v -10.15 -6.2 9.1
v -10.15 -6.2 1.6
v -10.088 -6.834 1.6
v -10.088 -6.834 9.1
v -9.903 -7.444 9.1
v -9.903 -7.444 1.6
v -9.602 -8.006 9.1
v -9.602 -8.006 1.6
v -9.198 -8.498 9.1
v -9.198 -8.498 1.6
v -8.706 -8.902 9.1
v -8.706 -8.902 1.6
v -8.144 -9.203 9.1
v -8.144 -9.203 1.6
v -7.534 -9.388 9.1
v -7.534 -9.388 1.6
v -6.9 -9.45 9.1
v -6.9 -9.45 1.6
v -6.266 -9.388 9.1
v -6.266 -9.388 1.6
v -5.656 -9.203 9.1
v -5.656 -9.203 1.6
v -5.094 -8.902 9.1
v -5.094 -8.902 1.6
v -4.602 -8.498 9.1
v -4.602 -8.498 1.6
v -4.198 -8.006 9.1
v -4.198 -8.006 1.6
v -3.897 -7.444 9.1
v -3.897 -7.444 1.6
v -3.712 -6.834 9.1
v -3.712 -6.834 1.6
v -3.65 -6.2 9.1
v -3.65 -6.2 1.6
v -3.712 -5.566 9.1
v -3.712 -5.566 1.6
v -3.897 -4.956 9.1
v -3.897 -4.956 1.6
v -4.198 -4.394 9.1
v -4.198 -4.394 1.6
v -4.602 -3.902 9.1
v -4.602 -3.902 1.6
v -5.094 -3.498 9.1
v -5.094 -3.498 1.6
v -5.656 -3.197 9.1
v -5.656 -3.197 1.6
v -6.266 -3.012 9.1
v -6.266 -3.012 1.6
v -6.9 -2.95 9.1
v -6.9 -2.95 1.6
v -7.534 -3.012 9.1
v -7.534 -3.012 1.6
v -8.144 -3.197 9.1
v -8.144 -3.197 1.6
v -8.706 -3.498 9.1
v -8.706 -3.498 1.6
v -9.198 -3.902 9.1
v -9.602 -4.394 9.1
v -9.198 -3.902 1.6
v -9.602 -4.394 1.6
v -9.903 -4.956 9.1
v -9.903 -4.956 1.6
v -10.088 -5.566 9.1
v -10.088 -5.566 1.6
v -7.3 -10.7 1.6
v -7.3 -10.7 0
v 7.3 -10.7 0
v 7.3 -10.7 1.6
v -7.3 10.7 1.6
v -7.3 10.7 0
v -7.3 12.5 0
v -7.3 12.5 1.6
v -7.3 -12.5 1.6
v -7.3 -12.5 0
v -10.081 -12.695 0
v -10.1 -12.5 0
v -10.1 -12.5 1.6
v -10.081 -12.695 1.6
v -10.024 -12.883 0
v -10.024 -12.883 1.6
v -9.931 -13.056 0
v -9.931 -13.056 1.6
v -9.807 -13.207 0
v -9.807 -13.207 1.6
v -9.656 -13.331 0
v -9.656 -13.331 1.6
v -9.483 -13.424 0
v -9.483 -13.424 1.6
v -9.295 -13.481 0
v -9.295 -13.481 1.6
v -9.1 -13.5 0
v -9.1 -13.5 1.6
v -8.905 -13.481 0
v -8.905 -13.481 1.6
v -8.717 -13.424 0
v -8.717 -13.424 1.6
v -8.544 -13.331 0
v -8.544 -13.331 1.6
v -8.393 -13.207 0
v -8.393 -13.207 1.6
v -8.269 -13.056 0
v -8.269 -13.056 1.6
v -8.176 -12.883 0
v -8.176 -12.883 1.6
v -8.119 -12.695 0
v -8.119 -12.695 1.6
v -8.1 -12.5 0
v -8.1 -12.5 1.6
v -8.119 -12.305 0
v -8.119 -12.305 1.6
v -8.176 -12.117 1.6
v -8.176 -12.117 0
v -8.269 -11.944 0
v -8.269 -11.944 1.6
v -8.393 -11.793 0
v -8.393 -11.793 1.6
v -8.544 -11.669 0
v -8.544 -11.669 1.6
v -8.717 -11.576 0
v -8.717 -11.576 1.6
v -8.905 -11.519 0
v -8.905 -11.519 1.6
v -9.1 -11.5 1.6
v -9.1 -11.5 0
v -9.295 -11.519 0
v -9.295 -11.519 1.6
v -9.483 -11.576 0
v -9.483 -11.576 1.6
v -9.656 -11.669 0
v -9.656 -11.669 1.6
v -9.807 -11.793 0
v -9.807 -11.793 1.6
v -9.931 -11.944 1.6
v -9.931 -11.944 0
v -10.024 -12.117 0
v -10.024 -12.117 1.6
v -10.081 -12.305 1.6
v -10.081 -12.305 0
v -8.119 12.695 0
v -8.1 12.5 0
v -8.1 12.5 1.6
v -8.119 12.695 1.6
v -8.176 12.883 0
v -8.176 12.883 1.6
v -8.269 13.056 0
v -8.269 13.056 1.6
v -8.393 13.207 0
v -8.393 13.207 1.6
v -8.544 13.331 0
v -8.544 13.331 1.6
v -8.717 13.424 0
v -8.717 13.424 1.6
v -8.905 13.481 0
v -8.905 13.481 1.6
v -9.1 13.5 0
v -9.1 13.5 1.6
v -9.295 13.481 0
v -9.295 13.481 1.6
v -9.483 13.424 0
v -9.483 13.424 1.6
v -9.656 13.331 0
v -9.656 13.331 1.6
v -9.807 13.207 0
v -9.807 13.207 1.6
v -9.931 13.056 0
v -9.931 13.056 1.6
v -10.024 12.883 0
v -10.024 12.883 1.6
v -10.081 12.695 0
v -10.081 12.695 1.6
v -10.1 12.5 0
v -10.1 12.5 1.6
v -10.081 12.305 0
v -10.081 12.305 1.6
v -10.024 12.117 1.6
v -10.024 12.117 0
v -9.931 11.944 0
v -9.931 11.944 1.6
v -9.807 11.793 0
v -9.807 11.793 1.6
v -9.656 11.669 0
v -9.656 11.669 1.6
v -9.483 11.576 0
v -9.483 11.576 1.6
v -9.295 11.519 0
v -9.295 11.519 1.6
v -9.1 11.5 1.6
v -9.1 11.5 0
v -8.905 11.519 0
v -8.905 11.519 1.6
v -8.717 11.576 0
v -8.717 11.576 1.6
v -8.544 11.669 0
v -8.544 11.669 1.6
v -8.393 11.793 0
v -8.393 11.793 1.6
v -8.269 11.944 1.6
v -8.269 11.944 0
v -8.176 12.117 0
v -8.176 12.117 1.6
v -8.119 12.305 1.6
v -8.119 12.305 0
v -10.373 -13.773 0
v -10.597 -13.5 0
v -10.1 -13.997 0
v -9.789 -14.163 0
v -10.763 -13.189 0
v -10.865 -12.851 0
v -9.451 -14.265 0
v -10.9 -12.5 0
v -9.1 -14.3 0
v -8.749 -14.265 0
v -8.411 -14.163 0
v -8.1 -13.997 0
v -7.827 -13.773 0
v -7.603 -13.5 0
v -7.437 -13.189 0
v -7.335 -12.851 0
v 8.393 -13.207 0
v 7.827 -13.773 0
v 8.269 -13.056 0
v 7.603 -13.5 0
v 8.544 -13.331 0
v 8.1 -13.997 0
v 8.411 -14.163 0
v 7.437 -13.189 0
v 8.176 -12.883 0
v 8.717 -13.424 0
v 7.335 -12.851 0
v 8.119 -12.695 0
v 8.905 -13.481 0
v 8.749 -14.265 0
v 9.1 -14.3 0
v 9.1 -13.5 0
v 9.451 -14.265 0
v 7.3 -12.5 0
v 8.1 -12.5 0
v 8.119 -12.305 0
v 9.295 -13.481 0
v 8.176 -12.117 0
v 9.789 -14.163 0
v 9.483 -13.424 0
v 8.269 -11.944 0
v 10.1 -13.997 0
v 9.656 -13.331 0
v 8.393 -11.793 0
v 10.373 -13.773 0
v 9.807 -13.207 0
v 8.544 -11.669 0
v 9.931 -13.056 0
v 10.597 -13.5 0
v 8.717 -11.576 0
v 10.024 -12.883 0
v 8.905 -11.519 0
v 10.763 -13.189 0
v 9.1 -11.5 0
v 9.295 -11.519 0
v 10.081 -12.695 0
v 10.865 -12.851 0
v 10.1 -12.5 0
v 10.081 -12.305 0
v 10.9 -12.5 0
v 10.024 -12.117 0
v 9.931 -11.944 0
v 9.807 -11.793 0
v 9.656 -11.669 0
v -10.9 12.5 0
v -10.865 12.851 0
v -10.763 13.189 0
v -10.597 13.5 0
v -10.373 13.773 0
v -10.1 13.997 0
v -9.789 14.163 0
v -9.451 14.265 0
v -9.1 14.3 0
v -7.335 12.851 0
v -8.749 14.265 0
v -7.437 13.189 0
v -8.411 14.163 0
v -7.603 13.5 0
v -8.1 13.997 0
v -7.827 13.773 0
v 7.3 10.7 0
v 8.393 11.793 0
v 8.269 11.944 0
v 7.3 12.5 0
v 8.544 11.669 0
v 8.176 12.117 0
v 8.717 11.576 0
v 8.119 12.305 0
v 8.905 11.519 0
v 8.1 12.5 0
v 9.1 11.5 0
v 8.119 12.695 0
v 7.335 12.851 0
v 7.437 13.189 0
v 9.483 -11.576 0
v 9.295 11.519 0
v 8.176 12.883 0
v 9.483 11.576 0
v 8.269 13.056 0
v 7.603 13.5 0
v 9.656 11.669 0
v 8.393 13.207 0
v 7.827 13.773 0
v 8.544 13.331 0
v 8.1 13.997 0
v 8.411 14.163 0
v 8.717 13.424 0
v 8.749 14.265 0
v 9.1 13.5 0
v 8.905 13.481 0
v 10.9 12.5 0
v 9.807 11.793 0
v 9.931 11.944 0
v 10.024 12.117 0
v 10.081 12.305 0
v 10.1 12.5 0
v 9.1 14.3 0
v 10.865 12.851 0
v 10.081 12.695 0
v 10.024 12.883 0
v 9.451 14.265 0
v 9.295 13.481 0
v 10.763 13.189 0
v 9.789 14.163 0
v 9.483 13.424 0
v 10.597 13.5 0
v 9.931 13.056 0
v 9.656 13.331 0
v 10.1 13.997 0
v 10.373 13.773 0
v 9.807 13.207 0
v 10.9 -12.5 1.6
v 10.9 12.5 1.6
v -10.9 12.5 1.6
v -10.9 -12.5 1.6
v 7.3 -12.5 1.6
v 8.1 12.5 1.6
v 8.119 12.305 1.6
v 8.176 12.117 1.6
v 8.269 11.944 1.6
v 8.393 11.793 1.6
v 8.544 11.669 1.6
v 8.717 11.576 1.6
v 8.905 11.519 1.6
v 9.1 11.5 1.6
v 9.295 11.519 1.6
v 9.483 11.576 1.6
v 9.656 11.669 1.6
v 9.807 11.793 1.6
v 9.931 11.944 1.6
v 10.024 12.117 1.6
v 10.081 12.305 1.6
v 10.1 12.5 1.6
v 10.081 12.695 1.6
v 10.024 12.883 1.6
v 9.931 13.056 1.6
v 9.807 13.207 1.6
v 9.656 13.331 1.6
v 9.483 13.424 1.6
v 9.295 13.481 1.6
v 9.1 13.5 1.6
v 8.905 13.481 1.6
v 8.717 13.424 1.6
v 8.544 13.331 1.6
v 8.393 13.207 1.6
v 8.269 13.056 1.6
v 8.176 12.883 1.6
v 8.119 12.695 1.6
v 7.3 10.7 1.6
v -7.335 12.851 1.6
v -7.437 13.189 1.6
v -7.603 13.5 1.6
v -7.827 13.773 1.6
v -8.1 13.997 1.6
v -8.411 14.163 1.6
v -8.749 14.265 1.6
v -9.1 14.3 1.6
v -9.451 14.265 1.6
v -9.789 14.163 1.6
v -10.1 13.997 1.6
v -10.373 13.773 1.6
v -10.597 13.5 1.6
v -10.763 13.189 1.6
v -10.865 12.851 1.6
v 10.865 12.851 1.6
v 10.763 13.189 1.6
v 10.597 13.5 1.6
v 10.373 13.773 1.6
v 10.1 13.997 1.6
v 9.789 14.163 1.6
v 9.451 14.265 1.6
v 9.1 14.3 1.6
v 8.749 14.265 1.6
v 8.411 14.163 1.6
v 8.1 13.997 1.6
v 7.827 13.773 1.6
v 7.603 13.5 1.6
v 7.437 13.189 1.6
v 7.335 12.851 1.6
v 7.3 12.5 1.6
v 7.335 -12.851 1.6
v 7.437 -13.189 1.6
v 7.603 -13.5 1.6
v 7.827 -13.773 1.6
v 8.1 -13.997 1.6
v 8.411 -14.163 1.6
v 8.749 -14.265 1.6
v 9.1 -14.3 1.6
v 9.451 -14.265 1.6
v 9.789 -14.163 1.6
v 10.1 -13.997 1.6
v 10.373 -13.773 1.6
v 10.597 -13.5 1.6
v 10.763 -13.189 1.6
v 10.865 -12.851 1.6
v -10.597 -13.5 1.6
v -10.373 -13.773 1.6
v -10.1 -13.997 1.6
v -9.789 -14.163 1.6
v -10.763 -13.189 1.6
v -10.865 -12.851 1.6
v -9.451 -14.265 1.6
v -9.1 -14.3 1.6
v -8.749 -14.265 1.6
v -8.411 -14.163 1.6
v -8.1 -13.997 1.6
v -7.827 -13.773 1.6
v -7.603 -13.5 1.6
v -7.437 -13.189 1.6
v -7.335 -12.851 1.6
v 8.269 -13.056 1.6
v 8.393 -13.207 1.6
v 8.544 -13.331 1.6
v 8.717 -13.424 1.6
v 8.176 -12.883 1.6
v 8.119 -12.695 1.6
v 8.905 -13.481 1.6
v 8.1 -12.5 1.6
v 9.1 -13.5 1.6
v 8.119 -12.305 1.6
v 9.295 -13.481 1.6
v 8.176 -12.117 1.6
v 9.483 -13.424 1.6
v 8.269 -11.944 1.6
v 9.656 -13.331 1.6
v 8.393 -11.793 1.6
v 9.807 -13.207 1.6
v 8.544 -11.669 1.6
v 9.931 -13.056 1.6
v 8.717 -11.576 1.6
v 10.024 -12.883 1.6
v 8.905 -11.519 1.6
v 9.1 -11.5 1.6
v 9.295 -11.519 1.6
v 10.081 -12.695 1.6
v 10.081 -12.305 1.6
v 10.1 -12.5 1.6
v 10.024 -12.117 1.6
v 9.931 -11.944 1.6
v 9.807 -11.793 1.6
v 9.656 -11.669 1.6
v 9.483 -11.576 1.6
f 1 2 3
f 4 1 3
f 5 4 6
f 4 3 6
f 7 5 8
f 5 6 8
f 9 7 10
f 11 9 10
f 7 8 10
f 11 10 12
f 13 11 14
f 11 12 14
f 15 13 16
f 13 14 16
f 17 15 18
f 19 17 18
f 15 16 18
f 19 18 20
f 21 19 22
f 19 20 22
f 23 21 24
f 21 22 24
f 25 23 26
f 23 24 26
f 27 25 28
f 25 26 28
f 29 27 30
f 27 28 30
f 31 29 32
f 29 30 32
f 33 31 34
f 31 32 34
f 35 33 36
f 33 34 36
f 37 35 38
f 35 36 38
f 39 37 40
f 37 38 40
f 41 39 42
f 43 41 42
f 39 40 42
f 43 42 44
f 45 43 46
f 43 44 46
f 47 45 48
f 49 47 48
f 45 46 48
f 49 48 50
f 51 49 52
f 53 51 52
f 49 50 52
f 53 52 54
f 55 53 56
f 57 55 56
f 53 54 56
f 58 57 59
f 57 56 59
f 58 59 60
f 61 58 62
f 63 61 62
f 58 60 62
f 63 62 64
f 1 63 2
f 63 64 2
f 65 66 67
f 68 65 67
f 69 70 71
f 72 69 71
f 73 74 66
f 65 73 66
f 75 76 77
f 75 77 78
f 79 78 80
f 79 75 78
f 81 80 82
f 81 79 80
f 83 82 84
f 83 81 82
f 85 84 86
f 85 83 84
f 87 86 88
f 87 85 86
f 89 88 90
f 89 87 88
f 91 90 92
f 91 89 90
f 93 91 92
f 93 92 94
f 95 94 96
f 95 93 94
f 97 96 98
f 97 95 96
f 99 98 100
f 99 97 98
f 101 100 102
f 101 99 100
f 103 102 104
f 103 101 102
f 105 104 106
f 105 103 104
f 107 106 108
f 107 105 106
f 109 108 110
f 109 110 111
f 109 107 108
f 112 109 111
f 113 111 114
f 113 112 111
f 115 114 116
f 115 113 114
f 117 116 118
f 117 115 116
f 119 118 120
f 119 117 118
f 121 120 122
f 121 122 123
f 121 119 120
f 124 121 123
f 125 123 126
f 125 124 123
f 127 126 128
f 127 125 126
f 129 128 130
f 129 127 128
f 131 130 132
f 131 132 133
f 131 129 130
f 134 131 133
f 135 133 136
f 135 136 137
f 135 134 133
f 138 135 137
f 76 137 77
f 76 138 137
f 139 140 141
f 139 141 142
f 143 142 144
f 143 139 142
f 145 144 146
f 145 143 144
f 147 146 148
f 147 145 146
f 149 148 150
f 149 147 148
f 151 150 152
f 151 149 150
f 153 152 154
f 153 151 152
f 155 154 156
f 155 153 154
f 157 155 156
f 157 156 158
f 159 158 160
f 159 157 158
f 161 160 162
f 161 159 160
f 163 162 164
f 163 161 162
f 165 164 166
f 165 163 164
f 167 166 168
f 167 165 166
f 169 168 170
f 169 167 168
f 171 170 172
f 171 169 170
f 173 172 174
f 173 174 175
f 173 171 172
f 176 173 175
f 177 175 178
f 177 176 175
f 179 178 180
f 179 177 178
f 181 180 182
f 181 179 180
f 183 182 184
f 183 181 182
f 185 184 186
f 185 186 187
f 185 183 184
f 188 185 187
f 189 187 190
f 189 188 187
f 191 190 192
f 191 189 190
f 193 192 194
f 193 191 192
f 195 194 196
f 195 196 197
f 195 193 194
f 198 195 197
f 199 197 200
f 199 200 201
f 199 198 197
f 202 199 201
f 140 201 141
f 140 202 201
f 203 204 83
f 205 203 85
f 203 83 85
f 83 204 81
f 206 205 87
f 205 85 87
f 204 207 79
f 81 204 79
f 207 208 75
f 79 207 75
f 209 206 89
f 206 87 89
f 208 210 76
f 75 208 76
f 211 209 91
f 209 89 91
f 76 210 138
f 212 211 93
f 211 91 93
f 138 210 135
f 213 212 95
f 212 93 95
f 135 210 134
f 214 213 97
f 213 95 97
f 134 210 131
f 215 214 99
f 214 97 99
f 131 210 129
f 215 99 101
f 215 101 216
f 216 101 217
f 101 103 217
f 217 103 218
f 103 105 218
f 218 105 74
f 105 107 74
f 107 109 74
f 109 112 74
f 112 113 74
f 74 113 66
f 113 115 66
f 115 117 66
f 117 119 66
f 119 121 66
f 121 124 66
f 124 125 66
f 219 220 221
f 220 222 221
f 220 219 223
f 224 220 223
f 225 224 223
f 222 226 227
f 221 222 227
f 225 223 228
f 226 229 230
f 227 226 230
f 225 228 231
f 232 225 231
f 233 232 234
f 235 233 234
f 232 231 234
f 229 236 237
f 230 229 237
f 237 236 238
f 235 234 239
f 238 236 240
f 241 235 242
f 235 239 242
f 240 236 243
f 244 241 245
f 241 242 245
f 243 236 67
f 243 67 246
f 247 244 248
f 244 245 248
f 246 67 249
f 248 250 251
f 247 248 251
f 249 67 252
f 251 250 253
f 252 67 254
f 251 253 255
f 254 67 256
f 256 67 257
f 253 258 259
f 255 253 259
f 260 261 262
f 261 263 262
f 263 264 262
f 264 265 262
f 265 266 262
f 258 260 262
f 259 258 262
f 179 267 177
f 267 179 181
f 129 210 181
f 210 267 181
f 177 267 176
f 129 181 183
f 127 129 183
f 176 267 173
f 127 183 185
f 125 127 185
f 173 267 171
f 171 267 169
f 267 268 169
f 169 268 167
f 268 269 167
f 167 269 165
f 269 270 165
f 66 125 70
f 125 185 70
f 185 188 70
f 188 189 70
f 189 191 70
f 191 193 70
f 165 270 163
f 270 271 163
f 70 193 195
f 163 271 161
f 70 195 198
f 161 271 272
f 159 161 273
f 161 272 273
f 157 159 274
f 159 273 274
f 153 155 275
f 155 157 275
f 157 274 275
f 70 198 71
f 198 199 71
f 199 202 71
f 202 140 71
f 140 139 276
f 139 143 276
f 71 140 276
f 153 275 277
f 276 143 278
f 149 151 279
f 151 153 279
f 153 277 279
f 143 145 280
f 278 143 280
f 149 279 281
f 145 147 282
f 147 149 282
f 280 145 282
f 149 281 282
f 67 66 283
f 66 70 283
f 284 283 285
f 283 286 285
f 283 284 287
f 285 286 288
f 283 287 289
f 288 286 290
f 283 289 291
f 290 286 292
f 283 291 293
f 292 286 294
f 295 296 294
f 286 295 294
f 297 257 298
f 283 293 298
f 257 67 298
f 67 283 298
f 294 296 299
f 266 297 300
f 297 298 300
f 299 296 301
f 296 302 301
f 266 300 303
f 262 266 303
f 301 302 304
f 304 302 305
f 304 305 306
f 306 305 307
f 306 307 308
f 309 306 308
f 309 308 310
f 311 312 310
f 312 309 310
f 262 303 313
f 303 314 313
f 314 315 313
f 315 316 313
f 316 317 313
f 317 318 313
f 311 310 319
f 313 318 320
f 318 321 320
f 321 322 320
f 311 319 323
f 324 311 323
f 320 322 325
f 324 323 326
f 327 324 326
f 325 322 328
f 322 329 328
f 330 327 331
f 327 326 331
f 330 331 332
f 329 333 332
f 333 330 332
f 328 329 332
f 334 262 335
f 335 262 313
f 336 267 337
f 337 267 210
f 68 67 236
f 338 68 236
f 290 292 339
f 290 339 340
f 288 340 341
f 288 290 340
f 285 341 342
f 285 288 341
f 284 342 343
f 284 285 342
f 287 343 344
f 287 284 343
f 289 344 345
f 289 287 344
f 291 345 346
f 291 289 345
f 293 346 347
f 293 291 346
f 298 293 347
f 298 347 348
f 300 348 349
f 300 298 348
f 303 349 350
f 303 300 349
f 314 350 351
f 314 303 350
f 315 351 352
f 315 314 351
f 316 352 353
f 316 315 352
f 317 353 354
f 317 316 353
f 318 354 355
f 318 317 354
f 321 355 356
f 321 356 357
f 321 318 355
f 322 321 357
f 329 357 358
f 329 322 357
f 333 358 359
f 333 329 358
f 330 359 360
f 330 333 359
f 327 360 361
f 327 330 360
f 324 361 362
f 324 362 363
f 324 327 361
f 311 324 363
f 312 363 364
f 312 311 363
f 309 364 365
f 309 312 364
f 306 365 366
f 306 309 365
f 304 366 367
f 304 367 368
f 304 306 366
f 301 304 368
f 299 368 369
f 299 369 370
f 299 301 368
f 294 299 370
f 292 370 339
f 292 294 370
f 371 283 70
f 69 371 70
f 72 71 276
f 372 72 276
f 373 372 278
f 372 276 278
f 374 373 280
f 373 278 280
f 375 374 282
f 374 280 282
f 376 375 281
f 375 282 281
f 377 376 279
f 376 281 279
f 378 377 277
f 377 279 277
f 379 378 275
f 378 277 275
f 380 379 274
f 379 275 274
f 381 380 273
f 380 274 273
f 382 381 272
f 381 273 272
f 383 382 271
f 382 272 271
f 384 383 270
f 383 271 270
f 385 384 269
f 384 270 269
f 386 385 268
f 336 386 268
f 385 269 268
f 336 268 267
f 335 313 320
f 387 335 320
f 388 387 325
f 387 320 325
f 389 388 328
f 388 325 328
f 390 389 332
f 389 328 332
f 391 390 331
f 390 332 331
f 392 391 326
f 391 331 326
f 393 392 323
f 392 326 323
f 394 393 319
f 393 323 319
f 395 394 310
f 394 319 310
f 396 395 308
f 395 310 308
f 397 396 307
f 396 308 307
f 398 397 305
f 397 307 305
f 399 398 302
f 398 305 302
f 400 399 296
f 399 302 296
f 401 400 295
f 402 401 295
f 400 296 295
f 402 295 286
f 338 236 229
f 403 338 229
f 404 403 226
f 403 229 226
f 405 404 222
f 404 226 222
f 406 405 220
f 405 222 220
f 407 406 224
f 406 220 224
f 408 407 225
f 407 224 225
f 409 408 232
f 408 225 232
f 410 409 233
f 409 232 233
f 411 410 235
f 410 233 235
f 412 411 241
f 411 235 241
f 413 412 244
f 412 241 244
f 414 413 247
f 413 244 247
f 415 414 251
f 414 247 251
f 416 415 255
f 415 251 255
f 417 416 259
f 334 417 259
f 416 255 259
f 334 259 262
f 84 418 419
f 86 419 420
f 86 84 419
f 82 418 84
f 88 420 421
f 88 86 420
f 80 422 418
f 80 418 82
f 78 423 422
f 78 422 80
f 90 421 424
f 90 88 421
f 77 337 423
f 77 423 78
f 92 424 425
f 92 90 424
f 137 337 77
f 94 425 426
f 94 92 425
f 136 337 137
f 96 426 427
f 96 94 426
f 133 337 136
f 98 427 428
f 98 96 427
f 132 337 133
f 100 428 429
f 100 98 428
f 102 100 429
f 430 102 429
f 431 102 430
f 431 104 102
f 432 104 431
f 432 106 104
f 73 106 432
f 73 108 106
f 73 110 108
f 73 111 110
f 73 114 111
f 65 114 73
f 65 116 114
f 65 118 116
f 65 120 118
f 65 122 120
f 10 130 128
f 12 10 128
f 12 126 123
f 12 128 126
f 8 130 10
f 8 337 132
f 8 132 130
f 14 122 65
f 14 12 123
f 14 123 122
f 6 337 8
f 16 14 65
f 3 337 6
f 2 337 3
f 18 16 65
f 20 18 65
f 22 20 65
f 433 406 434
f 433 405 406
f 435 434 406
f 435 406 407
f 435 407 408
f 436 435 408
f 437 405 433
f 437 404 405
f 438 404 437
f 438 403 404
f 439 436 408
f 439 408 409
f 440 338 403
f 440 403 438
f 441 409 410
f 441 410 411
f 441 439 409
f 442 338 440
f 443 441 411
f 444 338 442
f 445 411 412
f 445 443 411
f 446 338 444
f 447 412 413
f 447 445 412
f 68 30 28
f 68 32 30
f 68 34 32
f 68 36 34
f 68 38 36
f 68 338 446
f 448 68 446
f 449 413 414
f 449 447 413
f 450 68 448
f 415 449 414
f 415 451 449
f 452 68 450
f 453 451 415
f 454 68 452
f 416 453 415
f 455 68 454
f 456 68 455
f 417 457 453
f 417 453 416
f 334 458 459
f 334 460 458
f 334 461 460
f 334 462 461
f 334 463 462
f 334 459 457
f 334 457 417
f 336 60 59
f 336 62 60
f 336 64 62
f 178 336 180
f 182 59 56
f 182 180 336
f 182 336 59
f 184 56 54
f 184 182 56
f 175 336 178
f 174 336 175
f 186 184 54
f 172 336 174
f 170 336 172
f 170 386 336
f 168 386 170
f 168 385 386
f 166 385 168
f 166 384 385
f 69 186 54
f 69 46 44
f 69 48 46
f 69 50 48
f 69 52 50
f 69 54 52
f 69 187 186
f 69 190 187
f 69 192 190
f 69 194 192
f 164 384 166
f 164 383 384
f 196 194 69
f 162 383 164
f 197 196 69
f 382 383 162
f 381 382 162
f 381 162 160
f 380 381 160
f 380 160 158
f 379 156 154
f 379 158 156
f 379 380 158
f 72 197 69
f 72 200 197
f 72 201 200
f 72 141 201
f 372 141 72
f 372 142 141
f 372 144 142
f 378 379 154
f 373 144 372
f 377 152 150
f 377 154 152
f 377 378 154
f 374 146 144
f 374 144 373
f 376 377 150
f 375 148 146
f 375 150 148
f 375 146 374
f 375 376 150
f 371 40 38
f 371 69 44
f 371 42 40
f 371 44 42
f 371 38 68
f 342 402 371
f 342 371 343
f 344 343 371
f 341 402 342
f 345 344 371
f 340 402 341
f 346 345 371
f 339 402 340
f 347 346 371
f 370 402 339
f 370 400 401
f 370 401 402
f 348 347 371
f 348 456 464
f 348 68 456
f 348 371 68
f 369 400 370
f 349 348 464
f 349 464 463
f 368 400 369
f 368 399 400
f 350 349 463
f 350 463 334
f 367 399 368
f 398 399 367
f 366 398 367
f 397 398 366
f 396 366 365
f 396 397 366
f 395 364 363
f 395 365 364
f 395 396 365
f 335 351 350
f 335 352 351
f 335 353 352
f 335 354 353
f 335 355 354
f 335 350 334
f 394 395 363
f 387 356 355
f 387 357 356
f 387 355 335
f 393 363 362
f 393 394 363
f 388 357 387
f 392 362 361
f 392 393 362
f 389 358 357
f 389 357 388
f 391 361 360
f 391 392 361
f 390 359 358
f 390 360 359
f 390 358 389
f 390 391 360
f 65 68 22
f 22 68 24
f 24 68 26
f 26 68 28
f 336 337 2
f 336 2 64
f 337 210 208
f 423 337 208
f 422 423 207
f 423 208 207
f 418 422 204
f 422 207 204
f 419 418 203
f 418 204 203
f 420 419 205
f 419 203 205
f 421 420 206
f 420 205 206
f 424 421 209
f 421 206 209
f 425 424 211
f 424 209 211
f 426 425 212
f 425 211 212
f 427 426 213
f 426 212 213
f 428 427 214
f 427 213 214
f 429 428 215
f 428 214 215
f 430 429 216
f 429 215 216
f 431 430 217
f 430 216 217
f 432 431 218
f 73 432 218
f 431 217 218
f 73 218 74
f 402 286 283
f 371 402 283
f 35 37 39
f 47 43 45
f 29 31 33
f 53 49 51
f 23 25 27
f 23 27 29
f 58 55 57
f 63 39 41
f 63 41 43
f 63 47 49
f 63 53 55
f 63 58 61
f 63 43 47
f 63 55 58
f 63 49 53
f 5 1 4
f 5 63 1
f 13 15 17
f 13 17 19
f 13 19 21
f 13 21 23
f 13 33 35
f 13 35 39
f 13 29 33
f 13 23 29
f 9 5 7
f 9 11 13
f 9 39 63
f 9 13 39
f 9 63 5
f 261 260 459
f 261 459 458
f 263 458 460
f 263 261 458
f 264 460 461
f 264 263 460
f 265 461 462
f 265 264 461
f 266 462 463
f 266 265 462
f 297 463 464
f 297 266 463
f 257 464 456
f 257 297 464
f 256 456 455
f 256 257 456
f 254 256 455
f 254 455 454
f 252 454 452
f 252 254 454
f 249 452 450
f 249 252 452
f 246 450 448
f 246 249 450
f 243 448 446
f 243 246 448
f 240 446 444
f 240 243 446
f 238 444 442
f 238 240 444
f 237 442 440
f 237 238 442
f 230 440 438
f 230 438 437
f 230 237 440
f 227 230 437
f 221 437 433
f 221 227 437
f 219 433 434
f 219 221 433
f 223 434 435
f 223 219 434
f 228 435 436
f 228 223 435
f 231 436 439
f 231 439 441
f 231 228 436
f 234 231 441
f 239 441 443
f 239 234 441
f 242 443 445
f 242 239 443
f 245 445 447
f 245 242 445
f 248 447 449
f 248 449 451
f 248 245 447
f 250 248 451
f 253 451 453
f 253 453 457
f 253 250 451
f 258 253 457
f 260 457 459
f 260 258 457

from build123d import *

# Parameters (mm, degrees)
SKETCH1_R           = 1
BOSS_EXTRUDE1_DEPTH = 1.6
SKETCH2_R           = 3.25
BOSS_EXTRUDE2_DEPTH = 7.5


with BuildPart() as part:
    # Sketch1 → Boss-Extrude1 (new body)
    with BuildSketch(Plane.XY):
        with BuildLine():
            Line((-10.9, 10.7), (-10.9, -10.7))
            Line((-10.9, -10.7), (-10.9, -12.5))
            ThreePointArc((-10.9, -12.5), (-9.1, -14.3), (-7.3, -12.5))
            Line((-7.3, -12.5), (-7.3, -10.7))
            Line((-7.3, -10.7), (7.3, -10.7))
            Line((7.3, -10.7), (7.3, -12.5))
            ThreePointArc((7.3, -12.5), (9.1, -14.3), (10.9, -12.5))
            Line((10.9, -12.5), (10.9, -10.7))
            Line((10.9, -10.7), (10.9, 10.7))
            Line((10.9, 10.7), (10.9, 12.5))
            ThreePointArc((10.9, 12.5), (9.1, 14.3), (7.3, 12.5))
            Line((7.3, 12.5), (7.3, 10.7))
            Line((7.3, 10.7), (-7.3, 10.7))
            Line((-7.3, 10.7), (-7.3, 12.5))
            ThreePointArc((-7.3, 12.5), (-9.1, 14.3), (-10.9, 12.5))
            Line((-10.9, 12.5), (-10.9, 10.7))
        make_face()
        with Locations((-9.1, 12.5)):
            Circle(SKETCH1_R, mode=Mode.SUBTRACT)
        with Locations(Location((9.1, 12.5, 0), (0, 0, 180))):
            Circle(SKETCH1_R, mode=Mode.SUBTRACT)
        with Locations((9.1, -12.5)):
            Circle(SKETCH1_R, mode=Mode.SUBTRACT)
        with Locations(Location((-9.1, -12.5, 0), (0, 0, 180))):
            Circle(SKETCH1_R, mode=Mode.SUBTRACT)
    extrude(amount=BOSS_EXTRUDE1_DEPTH)

    # Sketch2 → Boss-Extrude2 (add)
    with BuildSketch(Plane.XY.offset(1.6)):
        with Locations(Location((-6.9, -6.2, 0), (0, 0, 180))):
            Circle(SKETCH2_R)
    extrude(amount=BOSS_EXTRUDE2_DEPTH)


solid = part.part
